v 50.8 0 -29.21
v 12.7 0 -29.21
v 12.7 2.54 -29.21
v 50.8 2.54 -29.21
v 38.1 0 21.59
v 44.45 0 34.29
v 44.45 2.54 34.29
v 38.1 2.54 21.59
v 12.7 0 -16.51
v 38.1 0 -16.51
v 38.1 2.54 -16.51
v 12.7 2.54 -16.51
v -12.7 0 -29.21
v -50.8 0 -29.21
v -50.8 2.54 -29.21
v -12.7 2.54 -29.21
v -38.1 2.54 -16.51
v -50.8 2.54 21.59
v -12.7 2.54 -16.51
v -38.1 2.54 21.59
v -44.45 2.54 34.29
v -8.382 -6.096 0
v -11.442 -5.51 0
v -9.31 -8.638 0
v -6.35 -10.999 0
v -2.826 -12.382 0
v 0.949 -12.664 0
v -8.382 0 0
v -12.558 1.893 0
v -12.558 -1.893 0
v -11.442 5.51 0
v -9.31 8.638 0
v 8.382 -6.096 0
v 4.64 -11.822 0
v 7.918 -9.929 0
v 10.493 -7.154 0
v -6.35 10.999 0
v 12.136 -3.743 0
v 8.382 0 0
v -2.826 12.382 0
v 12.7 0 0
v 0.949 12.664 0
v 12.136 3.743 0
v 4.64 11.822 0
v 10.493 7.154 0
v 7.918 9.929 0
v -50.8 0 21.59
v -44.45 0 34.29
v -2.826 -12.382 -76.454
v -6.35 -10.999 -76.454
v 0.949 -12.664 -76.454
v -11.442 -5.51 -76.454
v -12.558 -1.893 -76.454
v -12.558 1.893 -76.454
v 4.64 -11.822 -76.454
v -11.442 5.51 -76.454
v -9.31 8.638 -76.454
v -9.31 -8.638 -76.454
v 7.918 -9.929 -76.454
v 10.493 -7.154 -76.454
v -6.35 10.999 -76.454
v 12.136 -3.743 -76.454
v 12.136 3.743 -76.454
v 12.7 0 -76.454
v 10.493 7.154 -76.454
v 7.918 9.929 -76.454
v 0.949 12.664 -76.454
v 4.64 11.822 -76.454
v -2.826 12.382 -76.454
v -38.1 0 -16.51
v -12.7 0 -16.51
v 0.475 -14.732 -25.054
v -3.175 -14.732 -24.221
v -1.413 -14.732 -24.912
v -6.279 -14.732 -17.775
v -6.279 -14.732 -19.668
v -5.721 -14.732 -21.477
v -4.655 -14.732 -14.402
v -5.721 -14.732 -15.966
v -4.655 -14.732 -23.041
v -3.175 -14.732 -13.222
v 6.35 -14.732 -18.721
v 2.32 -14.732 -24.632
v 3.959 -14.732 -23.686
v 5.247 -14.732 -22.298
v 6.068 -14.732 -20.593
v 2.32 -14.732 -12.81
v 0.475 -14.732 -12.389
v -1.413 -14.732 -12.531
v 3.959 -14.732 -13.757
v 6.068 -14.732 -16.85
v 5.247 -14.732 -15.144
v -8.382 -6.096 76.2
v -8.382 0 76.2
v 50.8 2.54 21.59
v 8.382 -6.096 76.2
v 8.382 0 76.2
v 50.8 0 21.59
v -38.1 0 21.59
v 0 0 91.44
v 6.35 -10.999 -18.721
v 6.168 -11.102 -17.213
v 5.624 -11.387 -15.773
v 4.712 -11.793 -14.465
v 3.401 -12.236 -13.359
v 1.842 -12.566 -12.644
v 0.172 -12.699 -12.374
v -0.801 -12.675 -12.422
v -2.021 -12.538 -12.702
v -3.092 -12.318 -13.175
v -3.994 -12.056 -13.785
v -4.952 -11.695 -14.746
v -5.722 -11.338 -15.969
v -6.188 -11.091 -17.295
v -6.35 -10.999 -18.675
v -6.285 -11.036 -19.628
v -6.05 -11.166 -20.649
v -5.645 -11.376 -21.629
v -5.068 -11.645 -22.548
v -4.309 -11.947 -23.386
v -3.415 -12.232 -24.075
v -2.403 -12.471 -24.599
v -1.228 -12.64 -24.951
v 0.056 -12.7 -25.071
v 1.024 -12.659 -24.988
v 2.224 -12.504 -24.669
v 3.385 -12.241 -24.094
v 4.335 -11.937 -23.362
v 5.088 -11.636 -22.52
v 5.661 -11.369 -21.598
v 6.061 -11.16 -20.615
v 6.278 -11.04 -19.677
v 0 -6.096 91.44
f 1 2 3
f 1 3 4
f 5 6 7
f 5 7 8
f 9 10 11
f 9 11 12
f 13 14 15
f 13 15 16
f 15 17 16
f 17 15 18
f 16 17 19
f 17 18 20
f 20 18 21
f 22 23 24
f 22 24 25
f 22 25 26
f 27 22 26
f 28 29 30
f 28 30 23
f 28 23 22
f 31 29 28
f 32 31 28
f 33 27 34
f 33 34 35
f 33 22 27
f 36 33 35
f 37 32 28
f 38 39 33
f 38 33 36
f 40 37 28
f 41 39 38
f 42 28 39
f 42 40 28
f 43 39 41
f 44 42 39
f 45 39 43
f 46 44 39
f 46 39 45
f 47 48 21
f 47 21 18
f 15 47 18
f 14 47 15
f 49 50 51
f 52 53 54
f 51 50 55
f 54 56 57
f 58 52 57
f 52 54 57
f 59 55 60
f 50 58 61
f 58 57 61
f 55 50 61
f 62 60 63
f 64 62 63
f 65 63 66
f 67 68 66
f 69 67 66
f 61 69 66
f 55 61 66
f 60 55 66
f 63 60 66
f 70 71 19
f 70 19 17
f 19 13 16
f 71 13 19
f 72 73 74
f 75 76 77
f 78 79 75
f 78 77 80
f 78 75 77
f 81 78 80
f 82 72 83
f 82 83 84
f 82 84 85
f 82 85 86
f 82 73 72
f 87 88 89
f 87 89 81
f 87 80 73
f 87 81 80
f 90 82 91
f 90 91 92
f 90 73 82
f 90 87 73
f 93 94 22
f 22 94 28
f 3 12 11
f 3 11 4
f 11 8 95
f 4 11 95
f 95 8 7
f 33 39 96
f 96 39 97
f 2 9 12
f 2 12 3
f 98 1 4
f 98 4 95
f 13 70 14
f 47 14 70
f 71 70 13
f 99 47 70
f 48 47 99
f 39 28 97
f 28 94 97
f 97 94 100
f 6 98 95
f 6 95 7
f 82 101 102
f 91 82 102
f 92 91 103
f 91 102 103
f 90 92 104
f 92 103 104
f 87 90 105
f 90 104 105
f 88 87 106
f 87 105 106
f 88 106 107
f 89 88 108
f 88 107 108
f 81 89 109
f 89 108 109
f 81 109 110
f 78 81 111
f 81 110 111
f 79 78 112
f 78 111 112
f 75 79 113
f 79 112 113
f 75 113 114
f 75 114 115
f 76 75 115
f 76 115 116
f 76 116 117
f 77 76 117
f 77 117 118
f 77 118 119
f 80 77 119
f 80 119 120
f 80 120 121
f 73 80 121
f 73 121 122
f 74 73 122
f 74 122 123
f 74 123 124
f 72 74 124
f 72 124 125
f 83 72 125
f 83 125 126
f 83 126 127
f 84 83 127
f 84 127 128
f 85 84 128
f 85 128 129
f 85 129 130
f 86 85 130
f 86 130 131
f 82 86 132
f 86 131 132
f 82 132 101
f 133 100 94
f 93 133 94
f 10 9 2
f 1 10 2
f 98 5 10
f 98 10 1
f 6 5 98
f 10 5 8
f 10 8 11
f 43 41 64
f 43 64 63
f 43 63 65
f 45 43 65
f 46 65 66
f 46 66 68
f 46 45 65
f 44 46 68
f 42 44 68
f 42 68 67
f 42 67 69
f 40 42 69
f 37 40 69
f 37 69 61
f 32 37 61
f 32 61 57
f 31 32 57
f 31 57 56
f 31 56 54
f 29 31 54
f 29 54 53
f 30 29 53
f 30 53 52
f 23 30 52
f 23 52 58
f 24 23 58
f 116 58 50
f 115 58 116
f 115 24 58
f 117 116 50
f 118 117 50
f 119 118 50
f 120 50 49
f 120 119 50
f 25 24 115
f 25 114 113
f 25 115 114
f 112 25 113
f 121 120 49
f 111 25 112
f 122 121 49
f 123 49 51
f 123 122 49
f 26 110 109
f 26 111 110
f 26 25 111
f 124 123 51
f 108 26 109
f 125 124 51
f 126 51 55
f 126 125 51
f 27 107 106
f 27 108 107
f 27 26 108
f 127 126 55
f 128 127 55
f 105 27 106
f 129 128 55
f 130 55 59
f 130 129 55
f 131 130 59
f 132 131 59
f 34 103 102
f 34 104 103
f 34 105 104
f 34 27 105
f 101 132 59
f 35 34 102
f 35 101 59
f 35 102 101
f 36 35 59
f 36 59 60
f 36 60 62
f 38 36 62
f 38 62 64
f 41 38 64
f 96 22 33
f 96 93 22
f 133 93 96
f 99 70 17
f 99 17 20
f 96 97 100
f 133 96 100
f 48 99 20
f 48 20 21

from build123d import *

# Parameters (mm, degrees)
F0_R     = 12.7
F1_DEPTH = 76.454
F2_R     = 6.35
F3_DEPTH = 14.732
F5_DEPTH = 2.54
F7_DEPTH = 3.556
F8_DEPTH = 6.096


with BuildPart() as f1:
    # F0 (on Top) → F1 (new body)
    with BuildSketch(Plane.XY):
        Circle(F0_R)
    extrude(amount=-F1_DEPTH)

    # F2 (on Front) → F3 (join)
    with BuildSketch(Plane.XZ):
        with Locations((0, -18.721409)):
            Circle(F2_R)
    extrude(amount=F3_DEPTH)

    # F6 (on Front) → F7 (join)
    with BuildSketch(Plane.XZ):
        Polygon((-8.382, 0), (0, 0), (8.382, 0), (8.382, 76.2), (0, 76.2), (-8.382, 76.2), align=None)
        Polygon((0, 91.44), (-8.382, 76.2), (0, 76.2), align=None)
        Polygon((0, 76.2), (8.382, 76.2), (0, 91.44), align=None)
    extrude(amount=F7_DEPTH)

    # F6 (on Front) → F8 (join)
    with BuildSketch(Plane.XZ):
        Polygon((-8.382, 0), (0, 0), (8.382, 0), (8.382, 76.2), (0, 76.2), (-8.382, 76.2), align=None)
        Polygon((0, 91.44), (-8.382, 76.2), (0, 76.2), align=None)
        Polygon((0, 76.2), (8.382, 76.2), (0, 91.44), align=None)
    extrude(amount=F8_DEPTH)


with BuildPart() as f5:
    # F4 (on Front) → F5 (new body)
    with BuildSketch(Plane.XZ):
        Polygon((-50.8, -29.21), (-12.7, -29.21), (-12.7, -16.51), (-38.1, -16.51), (-38.1, 21.59), (-44.45, 21.59), (-50.8, 21.59), align=None)
        Polygon((12.7, -16.51), (12.7, -29.209968), (50.8, -29.209968), (50.8, 21.59), (44.45, 21.59), (38.1, 21.59), (38.1, -16.51), align=None)
        Polygon((-44.45, 34.29), (-50.8, 21.59), (-44.45, 21.59), align=None)
        Polygon((44.45, 21.59), (50.8, 21.59), (44.45, 34.29), align=None)
        Polygon((-44.45, 21.59), (-38.1, 21.59), (-44.45, 34.29), align=None)
        Polygon((44.45, 34.29), (38.1, 21.59), (44.45, 21.59), align=None)
    extrude(amount=-F5_DEPTH)


solid = Compound([f1.part, f5.part])
